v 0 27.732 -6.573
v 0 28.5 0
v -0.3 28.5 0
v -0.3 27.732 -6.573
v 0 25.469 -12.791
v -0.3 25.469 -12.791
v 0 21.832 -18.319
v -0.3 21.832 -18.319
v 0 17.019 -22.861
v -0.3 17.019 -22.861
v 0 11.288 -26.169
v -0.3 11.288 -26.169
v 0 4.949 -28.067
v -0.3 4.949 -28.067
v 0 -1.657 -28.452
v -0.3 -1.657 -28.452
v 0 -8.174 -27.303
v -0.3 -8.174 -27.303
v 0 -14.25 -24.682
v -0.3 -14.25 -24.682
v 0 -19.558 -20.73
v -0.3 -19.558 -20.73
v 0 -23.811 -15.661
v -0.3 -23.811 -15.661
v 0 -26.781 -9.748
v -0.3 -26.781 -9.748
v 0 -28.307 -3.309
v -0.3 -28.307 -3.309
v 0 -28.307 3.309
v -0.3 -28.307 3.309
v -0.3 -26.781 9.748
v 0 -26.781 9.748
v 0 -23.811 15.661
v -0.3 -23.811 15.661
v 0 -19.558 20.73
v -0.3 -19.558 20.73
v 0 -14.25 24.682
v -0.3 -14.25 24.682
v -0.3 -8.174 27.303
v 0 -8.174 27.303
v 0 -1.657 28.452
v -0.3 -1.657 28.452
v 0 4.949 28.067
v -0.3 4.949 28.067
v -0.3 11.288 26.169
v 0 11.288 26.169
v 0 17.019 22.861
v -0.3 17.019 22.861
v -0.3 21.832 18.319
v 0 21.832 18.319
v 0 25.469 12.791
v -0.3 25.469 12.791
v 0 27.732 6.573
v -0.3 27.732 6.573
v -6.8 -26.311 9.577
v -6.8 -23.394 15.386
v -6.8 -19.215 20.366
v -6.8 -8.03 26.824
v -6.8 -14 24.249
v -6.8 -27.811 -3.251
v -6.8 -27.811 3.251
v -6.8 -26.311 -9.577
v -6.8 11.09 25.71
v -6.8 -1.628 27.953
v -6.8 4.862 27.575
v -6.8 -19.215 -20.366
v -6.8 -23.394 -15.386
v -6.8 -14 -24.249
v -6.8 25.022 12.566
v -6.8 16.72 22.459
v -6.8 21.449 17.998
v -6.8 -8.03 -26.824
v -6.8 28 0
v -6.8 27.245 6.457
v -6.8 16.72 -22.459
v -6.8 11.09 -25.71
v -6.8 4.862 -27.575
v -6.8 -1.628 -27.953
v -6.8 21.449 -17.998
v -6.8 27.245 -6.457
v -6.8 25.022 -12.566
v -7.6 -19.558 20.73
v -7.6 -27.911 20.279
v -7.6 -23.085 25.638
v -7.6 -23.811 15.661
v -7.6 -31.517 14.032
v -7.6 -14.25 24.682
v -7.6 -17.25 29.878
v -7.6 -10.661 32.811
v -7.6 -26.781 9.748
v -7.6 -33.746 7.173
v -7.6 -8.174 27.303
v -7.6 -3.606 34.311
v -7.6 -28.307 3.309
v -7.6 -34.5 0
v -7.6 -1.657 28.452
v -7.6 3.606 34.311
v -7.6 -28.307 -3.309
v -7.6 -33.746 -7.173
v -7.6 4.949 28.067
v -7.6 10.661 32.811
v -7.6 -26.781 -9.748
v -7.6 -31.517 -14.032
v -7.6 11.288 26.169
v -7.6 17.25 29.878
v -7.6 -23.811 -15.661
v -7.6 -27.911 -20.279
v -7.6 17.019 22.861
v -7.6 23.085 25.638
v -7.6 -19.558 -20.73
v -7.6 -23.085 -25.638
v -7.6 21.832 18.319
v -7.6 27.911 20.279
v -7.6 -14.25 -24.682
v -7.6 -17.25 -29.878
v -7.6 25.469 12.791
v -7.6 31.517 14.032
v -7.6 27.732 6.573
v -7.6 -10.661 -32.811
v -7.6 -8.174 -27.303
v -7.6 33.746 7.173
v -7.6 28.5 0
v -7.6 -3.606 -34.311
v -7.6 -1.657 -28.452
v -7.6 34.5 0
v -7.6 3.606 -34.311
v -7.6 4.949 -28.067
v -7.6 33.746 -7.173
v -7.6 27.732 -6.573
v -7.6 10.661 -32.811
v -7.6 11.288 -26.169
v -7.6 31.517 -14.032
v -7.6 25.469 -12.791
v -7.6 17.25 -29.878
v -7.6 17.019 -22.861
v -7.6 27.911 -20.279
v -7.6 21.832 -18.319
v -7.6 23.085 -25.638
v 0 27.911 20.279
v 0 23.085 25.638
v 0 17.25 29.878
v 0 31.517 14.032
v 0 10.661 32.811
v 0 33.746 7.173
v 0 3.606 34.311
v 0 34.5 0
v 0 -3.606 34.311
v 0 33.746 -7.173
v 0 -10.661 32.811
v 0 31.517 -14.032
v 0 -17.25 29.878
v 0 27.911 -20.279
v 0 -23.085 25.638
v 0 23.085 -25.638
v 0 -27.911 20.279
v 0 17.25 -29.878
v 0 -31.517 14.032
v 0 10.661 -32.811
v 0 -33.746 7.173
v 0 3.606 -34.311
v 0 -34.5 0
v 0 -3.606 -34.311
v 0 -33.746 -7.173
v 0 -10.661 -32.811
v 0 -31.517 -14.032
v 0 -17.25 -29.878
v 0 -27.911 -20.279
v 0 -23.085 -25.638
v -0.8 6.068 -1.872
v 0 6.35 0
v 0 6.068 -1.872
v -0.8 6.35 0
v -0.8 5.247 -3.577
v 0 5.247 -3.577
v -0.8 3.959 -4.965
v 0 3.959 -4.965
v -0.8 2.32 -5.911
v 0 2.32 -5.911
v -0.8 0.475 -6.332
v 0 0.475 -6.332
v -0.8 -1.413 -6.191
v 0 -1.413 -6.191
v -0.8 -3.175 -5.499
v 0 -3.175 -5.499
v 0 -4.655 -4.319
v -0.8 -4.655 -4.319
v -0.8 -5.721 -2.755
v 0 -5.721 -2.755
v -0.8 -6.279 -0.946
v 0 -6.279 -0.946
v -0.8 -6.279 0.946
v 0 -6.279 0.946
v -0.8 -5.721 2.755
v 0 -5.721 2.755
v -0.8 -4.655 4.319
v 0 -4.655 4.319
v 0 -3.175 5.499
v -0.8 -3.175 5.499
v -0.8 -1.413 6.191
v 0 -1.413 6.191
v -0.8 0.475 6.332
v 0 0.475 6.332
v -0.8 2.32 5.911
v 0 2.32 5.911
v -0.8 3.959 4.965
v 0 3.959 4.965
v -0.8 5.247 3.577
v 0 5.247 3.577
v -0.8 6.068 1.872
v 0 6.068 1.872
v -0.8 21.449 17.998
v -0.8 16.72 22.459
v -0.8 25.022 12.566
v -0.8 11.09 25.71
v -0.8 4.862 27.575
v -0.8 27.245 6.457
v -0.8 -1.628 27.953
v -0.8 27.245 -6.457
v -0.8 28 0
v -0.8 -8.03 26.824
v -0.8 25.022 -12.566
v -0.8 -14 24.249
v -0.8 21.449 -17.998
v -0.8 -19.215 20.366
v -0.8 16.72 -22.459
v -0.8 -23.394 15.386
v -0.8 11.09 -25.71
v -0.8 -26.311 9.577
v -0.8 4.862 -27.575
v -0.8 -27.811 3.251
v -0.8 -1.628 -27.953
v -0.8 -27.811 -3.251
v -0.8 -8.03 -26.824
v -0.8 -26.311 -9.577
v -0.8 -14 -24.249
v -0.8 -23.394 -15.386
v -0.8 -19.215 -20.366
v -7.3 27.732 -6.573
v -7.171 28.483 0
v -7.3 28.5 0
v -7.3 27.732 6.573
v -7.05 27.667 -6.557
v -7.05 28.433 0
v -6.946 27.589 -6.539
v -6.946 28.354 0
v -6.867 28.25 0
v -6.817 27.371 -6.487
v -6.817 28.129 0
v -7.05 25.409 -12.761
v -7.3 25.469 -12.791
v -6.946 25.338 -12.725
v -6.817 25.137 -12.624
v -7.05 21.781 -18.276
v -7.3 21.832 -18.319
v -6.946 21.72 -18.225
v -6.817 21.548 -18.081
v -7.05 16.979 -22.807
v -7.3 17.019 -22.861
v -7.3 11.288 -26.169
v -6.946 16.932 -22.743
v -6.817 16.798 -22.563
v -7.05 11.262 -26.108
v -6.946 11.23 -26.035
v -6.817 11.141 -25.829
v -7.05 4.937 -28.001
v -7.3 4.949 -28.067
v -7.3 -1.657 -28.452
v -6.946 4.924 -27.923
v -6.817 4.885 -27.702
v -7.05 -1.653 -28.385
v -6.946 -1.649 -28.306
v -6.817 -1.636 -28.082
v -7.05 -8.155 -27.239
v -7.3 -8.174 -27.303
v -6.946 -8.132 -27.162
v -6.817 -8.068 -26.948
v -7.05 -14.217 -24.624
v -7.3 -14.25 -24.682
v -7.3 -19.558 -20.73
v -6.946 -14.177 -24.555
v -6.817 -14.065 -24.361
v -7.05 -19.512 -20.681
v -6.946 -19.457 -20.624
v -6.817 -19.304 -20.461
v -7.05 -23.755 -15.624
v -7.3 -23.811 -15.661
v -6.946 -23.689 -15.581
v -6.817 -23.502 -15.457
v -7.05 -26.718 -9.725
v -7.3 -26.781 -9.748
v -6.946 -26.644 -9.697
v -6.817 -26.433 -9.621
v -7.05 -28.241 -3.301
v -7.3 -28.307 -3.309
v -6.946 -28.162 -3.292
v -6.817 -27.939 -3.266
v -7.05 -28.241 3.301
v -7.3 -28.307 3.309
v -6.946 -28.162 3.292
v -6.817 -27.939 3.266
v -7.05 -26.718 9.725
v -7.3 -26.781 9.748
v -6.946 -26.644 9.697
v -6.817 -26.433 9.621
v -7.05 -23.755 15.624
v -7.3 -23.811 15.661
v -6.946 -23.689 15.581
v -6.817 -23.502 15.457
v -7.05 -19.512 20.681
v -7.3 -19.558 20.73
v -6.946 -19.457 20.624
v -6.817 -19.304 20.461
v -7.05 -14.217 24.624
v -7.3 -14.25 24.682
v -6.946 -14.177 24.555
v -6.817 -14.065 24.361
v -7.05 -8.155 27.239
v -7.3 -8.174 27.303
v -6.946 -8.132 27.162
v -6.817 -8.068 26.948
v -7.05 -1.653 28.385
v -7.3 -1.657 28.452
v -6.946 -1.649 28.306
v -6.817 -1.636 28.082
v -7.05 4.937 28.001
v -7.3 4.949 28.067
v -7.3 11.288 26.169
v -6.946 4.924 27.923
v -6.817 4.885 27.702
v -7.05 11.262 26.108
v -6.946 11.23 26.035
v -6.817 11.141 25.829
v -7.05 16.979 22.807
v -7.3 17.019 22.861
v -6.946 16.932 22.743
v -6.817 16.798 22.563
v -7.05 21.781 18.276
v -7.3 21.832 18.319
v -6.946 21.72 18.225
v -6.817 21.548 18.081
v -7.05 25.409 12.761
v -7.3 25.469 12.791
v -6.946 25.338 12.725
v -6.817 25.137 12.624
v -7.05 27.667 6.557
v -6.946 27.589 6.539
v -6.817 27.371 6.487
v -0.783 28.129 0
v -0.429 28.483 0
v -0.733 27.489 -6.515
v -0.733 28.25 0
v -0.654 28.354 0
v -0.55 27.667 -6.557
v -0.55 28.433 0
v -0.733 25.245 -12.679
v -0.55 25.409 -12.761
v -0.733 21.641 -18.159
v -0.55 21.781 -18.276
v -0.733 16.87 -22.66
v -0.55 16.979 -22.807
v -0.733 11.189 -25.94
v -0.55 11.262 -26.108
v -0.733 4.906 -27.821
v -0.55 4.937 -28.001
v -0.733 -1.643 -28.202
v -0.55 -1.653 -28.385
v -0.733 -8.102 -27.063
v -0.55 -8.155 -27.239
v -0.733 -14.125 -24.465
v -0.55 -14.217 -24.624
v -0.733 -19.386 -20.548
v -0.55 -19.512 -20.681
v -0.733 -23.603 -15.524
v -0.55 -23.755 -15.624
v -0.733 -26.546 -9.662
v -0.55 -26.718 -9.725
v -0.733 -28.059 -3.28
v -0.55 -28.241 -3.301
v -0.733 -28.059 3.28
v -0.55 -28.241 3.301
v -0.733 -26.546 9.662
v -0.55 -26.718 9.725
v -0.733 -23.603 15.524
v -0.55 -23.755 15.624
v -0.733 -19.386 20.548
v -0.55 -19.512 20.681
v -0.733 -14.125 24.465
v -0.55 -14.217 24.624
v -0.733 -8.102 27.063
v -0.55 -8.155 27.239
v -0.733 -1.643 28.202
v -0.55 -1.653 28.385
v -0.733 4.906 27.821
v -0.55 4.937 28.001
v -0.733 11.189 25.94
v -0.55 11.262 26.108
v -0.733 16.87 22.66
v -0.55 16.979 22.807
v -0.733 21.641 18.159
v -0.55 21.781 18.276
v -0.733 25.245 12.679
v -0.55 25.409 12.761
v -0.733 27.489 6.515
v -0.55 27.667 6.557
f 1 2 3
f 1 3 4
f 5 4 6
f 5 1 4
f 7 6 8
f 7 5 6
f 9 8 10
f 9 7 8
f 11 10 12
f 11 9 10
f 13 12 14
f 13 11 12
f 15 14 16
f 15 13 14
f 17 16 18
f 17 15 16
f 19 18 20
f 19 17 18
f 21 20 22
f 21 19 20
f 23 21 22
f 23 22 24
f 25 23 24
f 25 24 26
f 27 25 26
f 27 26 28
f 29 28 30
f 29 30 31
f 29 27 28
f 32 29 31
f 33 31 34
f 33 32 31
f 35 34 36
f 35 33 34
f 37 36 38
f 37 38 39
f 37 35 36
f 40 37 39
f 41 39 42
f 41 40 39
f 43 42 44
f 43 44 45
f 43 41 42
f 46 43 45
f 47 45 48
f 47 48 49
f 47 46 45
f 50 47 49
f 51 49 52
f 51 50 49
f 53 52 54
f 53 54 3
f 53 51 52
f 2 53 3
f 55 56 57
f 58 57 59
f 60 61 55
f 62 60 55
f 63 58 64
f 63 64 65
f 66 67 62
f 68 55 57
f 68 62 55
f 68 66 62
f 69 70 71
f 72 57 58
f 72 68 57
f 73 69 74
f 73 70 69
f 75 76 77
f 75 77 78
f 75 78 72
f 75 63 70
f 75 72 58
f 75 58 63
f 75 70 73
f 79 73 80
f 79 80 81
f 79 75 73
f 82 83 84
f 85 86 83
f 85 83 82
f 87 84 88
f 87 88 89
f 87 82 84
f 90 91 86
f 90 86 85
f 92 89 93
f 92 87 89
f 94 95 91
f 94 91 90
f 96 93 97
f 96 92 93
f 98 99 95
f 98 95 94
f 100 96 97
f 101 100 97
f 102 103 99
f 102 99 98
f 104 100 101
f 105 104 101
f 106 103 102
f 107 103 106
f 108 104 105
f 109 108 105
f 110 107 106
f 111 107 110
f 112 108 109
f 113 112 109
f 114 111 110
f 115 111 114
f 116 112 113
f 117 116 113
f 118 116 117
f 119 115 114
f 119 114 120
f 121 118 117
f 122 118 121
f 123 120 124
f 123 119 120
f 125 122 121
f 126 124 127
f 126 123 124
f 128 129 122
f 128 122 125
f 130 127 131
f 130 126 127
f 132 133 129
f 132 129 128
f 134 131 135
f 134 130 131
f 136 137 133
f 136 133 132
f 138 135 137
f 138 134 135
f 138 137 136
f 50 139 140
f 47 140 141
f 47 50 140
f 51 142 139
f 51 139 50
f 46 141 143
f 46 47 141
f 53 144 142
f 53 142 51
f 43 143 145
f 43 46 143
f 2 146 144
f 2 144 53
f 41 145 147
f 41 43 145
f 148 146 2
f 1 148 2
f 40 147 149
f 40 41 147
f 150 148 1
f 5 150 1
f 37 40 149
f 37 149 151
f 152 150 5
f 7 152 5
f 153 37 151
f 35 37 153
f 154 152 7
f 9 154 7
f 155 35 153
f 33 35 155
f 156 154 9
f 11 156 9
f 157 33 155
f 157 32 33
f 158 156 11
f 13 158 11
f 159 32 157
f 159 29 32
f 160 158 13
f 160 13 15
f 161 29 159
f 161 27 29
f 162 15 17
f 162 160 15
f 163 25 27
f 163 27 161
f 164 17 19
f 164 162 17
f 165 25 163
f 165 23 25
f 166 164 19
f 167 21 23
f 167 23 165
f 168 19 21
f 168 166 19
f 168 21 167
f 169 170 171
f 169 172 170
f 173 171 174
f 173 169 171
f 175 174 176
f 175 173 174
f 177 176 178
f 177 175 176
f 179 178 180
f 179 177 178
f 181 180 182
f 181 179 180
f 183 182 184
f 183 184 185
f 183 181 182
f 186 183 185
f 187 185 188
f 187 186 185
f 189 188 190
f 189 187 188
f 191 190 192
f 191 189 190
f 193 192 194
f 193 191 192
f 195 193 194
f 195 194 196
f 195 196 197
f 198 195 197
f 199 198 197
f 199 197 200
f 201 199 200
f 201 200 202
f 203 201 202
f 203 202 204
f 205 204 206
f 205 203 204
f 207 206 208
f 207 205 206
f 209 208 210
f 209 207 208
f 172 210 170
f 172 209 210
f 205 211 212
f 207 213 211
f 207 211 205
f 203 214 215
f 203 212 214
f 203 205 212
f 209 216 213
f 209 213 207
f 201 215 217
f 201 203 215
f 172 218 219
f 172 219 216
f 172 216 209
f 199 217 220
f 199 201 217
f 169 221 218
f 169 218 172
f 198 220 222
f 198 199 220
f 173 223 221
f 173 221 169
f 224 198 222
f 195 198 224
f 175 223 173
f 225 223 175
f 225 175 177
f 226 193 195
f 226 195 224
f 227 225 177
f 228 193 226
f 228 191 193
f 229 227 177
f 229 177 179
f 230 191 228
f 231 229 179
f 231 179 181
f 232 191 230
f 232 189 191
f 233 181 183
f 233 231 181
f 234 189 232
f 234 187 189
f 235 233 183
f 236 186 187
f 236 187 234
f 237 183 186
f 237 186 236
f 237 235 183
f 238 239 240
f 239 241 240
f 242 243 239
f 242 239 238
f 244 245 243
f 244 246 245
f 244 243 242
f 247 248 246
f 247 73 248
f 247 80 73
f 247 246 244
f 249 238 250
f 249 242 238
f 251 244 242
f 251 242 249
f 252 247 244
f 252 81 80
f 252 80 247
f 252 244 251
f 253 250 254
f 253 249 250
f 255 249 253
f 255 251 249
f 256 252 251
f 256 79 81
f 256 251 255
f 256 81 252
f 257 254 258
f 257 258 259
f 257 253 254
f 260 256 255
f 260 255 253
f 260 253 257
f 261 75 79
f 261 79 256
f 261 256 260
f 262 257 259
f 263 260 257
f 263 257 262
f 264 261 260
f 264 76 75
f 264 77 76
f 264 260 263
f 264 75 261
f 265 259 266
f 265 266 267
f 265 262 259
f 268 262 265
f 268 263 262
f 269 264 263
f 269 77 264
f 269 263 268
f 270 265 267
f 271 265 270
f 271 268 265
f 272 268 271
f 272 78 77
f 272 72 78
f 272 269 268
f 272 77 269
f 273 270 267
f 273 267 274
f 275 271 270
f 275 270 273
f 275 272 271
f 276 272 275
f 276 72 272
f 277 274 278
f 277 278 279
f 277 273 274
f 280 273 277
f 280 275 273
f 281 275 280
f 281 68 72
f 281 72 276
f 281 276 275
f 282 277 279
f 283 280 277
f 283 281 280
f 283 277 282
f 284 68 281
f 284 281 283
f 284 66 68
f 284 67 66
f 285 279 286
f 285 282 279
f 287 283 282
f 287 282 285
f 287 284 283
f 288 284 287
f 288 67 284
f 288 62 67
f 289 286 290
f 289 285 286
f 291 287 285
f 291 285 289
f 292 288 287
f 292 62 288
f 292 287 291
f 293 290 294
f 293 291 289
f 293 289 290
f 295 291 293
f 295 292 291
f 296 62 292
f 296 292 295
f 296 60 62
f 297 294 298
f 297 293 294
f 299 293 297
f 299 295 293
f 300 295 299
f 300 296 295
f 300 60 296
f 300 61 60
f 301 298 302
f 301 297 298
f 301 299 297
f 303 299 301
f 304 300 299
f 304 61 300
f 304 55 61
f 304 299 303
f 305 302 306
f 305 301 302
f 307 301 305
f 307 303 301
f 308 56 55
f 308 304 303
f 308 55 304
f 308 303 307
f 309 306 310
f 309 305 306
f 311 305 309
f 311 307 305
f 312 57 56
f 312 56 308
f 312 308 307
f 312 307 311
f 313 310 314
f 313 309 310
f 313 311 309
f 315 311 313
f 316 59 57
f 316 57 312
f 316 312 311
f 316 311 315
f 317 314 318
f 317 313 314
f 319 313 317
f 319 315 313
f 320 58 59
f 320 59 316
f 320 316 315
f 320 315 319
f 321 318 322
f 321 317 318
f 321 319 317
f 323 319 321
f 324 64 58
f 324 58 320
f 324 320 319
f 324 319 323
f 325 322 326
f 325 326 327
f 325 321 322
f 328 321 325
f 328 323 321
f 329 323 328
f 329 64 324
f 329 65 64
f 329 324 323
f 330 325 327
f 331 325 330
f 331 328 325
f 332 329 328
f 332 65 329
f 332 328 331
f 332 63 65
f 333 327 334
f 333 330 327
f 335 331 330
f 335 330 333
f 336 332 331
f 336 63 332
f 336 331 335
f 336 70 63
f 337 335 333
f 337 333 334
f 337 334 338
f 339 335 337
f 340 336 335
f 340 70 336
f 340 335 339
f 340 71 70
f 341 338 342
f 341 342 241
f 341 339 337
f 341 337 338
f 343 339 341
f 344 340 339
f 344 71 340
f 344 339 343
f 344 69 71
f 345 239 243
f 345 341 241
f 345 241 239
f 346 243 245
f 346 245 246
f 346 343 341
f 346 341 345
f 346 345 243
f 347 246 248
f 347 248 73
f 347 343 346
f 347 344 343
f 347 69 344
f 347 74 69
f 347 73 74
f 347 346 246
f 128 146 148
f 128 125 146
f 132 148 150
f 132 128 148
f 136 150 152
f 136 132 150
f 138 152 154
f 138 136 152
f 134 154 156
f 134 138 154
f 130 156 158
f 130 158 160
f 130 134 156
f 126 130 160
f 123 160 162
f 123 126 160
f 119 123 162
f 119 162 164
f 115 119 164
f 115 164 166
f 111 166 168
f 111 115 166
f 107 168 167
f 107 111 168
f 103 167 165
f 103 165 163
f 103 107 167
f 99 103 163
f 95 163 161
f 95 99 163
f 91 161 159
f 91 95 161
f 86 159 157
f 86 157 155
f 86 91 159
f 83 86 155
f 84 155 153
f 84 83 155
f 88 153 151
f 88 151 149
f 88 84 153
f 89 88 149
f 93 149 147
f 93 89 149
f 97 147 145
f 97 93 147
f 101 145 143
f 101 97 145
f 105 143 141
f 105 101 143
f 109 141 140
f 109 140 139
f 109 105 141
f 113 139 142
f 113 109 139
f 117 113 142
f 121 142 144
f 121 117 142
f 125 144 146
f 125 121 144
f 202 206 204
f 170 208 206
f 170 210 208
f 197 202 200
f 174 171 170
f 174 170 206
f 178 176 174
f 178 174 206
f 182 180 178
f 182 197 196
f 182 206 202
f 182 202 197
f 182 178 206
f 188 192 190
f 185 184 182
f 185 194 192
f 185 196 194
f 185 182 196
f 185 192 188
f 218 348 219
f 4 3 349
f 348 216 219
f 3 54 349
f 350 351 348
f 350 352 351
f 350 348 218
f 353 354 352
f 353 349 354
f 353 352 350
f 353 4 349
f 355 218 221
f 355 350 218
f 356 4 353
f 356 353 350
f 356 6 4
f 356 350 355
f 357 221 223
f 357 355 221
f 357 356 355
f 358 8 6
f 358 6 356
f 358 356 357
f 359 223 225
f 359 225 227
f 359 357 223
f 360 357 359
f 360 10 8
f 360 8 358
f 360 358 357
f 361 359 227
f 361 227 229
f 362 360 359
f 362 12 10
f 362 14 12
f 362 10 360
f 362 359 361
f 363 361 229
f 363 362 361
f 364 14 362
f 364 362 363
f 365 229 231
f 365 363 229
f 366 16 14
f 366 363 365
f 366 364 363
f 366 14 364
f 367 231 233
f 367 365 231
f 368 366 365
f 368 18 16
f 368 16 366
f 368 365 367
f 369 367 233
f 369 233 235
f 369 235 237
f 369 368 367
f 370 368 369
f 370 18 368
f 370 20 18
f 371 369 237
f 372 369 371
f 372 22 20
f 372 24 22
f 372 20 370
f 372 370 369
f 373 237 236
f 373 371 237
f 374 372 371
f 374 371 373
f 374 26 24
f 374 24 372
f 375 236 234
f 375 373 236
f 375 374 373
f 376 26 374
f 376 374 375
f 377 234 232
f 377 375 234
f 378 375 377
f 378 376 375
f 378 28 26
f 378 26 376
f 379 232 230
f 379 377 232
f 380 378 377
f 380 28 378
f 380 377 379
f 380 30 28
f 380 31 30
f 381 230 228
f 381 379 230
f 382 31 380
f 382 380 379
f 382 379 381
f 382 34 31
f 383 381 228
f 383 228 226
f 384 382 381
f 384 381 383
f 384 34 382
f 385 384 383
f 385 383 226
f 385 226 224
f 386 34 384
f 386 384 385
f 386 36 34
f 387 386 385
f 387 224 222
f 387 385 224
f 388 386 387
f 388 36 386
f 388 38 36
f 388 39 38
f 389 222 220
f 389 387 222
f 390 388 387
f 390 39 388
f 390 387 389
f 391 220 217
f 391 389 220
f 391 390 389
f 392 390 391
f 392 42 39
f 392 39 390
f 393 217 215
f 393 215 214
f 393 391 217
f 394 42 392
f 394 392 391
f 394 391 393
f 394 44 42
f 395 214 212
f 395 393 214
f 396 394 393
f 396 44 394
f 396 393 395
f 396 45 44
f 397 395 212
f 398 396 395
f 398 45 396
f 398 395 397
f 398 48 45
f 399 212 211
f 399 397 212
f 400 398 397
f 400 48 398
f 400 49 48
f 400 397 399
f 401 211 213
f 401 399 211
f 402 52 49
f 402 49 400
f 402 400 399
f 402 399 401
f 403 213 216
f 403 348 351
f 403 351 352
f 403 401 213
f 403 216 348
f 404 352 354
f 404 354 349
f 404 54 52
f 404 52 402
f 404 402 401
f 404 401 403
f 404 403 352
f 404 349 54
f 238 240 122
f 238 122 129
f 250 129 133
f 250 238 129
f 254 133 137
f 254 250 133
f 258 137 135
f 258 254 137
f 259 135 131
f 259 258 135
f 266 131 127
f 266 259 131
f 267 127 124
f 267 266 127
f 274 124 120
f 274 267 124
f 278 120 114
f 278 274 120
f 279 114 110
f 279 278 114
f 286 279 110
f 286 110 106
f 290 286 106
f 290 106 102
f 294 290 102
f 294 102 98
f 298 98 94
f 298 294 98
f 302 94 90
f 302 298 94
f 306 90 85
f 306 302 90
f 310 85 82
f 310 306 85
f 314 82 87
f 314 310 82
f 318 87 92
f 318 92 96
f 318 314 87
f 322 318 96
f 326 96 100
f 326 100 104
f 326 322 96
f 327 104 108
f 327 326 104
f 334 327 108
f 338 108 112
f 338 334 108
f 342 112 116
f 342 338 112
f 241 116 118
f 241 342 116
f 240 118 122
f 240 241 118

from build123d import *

# Parameters (mm, degrees)
FILLET1_R = 0.5


with BuildPart() as part:
    # Sketch3 → Revolve1 (revolve)
    with BuildSketch(Plane.XY):
        Polygon((-7.6, 28.5), (-6.8, 28.5), (-6.8, 0), (-0.8, 0), (0, 0), (0, 6.35), (-0.8, 6.35), (-0.8, 28.5), (0, 28.5), (0, 34.5), (-7.6, 34.5), align=None)
    revolve(axis=Axis((-0.8, 0, 0), (-1, 0, 0)))

    # Fillet1
    fillet1_edges = [part.edges().sort_by_distance(p)[0] for p in [
        (-6.8, -28.5, 0),
        (-0.8, -28.5, 0),
    ]]
    fillet(fillet1_edges, radius=FILLET1_R)


solid = part.part
